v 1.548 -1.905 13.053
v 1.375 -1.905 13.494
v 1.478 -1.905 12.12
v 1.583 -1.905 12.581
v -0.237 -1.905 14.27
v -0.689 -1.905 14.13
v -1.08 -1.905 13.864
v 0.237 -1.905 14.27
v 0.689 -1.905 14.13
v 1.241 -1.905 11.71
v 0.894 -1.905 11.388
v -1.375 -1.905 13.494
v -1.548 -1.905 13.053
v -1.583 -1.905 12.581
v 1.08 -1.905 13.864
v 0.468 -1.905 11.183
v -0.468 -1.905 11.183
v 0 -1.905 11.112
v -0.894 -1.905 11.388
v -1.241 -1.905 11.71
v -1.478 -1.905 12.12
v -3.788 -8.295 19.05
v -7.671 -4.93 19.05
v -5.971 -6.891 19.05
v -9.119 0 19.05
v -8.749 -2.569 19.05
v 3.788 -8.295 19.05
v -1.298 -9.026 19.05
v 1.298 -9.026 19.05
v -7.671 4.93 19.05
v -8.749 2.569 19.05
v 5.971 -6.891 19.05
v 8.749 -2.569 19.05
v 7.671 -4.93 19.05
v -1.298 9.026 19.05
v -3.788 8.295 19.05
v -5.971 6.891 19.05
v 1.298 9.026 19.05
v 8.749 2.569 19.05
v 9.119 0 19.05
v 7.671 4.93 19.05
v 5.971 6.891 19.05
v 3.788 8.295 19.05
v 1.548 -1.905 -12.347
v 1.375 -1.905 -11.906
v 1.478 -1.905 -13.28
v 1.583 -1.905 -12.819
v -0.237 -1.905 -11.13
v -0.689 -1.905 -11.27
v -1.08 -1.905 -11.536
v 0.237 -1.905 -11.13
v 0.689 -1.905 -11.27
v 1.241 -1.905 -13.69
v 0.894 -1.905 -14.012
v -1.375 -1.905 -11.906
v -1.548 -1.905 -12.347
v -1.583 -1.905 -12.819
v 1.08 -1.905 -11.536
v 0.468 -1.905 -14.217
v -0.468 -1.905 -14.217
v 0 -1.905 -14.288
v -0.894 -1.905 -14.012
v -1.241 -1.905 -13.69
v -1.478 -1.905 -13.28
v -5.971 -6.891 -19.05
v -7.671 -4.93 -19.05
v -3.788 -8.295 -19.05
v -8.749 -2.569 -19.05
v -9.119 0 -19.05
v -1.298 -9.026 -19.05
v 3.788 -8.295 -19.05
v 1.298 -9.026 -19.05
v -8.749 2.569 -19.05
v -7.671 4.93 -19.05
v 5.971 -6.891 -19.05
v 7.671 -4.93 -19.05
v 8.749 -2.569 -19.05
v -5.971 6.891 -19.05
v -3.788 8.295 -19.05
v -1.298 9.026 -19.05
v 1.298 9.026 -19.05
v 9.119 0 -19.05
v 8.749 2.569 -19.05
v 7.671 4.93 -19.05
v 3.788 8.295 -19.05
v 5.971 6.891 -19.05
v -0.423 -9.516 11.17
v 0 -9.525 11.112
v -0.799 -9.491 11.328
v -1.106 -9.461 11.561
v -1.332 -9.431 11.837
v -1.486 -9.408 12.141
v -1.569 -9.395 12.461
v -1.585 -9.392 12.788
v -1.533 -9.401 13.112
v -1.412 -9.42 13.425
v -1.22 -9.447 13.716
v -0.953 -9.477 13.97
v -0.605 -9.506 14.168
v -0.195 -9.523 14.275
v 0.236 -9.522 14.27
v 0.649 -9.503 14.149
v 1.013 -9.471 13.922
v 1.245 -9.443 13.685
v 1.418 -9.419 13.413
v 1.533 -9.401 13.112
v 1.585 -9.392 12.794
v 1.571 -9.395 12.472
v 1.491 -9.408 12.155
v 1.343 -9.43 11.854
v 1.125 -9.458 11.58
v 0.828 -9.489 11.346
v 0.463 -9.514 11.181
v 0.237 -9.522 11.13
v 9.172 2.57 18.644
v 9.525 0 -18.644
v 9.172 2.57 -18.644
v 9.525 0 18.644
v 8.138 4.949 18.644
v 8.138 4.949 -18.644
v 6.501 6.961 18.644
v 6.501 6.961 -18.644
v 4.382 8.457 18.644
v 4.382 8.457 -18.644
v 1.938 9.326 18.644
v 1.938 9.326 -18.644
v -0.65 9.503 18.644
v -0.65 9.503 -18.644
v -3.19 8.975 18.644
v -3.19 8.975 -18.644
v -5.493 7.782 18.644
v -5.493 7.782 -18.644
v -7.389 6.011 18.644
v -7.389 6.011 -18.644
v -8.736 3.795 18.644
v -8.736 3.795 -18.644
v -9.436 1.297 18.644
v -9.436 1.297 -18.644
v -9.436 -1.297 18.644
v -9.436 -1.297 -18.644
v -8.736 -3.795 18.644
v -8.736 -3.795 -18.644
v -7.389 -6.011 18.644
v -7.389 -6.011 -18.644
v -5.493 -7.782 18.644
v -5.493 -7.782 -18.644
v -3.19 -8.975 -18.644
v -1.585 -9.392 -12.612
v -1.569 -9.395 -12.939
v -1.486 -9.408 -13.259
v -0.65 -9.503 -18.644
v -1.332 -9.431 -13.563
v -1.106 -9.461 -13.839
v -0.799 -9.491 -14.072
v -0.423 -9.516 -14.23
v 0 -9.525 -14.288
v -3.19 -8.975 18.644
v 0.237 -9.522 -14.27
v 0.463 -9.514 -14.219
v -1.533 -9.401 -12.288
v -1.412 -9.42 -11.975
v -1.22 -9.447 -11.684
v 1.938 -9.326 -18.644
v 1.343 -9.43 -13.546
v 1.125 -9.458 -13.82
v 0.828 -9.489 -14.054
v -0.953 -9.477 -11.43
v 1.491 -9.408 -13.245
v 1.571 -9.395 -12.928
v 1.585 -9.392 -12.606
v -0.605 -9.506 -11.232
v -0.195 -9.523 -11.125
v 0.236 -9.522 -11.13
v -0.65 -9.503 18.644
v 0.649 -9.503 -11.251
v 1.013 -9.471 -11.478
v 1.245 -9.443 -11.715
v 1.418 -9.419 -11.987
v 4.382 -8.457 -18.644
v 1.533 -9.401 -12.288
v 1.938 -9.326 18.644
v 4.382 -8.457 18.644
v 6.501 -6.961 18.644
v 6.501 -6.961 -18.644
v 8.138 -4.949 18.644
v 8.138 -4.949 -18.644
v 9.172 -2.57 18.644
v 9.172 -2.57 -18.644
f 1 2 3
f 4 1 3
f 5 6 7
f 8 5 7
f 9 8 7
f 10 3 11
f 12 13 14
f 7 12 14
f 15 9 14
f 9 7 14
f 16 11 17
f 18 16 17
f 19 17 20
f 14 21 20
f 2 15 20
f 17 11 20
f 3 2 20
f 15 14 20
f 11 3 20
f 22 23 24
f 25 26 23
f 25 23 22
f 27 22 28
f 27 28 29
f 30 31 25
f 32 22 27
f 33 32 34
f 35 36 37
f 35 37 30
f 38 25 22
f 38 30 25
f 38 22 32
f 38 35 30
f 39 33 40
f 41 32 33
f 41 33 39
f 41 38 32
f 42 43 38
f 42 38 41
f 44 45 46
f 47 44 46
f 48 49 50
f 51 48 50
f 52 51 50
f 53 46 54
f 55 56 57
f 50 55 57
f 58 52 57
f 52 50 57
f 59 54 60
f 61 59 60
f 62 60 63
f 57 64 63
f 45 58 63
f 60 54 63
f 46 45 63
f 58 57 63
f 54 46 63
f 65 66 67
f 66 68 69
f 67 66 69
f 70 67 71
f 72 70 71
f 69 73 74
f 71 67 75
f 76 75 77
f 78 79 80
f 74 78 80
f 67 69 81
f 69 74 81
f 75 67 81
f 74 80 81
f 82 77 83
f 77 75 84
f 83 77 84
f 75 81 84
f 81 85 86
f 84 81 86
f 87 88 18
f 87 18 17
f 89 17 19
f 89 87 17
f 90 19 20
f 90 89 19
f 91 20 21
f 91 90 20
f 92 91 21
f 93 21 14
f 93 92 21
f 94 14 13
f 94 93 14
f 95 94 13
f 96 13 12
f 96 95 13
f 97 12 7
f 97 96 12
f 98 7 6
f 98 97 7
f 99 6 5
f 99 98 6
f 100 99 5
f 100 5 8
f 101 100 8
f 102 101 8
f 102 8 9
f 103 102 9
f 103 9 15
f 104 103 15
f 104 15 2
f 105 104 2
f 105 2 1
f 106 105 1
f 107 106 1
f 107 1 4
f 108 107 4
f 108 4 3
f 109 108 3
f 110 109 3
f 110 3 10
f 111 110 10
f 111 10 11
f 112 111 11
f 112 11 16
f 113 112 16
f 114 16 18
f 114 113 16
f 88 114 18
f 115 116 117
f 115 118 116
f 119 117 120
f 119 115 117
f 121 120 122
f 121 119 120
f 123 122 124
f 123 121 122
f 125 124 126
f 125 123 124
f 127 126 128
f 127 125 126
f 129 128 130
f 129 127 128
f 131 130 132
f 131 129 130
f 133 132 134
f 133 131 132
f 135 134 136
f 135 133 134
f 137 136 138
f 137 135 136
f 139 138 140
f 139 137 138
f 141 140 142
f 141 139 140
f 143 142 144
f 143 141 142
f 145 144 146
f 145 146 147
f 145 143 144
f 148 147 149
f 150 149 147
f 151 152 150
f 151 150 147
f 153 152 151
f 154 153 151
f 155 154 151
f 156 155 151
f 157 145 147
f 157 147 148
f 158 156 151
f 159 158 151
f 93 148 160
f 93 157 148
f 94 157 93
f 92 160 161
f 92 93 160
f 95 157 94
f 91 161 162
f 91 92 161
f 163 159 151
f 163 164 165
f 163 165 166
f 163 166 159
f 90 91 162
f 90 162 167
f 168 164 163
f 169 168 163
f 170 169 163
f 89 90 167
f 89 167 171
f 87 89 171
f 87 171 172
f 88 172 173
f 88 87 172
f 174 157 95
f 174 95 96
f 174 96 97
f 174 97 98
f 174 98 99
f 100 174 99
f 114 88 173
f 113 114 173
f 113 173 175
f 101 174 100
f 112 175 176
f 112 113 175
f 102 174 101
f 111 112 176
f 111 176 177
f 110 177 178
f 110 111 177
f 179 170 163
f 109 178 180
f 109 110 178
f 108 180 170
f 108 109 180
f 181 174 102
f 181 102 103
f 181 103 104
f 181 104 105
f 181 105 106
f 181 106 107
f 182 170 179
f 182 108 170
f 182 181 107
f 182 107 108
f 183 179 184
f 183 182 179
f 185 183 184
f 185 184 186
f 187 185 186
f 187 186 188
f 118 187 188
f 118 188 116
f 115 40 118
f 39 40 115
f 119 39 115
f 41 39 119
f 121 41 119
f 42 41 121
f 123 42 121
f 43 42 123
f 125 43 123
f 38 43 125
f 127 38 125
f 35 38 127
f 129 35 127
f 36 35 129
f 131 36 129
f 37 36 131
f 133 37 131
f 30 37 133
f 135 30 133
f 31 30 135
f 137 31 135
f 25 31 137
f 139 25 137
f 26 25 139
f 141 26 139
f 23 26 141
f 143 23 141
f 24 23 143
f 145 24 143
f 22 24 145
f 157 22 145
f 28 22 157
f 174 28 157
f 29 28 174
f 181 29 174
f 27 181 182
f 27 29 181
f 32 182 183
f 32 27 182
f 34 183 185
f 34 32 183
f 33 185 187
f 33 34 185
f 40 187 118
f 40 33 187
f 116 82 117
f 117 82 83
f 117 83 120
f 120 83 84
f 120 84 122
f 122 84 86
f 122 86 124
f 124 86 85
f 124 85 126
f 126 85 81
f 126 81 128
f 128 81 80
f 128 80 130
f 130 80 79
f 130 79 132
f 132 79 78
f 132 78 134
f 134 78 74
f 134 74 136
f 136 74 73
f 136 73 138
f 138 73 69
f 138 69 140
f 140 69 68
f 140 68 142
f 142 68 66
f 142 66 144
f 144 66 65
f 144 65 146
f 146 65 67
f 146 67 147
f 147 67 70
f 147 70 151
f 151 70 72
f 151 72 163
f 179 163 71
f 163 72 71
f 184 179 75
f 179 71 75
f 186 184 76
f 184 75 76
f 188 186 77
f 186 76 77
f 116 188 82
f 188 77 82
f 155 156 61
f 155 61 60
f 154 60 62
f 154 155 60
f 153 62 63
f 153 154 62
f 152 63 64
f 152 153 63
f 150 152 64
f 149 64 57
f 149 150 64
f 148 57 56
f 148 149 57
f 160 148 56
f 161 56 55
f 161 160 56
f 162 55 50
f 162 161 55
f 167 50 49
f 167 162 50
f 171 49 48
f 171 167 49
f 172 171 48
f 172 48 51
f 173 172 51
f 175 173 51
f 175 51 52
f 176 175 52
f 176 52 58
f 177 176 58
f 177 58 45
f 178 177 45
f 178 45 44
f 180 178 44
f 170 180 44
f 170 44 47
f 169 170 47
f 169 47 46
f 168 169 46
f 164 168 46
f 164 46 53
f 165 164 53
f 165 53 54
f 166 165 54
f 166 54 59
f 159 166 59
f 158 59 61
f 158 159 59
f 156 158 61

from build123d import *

# Parameters (mm, degrees)
SKETCH1_R         = 9.525
EXTRUDE1_DEPTH    = 19.05
CHAMFER1_SIZE     = 0.4064
SKETCH6_R         = 1.5875
BLIND_HOLES_DEPTH = 7.62


with BuildPart() as part:
    # Sketch1 → Extrude1 (new body, symmetric)
    with BuildSketch(Plane.XY):
        Circle(SKETCH1_R)
    extrude(amount=EXTRUDE1_DEPTH, both=True)

    # Chamfer1
    chamfer1_edges = [part.edges().sort_by_distance(p)[0] for p in [
        (-9.525, 0, -19.05),
        (-9.525, 0, 19.05),
    ]]
    chamfer(chamfer1_edges, length=CHAMFER1_SIZE)

    # Sketch6 → Blind Holes (cut)
    with BuildSketch(Plane(origin=(0, -9.525, 0), x_dir=(-1, 0, 0), z_dir=(0, 1, 0))):
        with Locations(Location((0, 12.7, 0), (0, 0, 270))):  # turned: the seam where the file's is
            Circle(SKETCH6_R)
        with Locations(Location((0, -12.7, 0), (0, 0, 270))):  # turned: the seam where the file's is
            Circle(SKETCH6_R)
    extrude(amount=BLIND_HOLES_DEPTH, mode=Mode.SUBTRACT)


solid = part.part
